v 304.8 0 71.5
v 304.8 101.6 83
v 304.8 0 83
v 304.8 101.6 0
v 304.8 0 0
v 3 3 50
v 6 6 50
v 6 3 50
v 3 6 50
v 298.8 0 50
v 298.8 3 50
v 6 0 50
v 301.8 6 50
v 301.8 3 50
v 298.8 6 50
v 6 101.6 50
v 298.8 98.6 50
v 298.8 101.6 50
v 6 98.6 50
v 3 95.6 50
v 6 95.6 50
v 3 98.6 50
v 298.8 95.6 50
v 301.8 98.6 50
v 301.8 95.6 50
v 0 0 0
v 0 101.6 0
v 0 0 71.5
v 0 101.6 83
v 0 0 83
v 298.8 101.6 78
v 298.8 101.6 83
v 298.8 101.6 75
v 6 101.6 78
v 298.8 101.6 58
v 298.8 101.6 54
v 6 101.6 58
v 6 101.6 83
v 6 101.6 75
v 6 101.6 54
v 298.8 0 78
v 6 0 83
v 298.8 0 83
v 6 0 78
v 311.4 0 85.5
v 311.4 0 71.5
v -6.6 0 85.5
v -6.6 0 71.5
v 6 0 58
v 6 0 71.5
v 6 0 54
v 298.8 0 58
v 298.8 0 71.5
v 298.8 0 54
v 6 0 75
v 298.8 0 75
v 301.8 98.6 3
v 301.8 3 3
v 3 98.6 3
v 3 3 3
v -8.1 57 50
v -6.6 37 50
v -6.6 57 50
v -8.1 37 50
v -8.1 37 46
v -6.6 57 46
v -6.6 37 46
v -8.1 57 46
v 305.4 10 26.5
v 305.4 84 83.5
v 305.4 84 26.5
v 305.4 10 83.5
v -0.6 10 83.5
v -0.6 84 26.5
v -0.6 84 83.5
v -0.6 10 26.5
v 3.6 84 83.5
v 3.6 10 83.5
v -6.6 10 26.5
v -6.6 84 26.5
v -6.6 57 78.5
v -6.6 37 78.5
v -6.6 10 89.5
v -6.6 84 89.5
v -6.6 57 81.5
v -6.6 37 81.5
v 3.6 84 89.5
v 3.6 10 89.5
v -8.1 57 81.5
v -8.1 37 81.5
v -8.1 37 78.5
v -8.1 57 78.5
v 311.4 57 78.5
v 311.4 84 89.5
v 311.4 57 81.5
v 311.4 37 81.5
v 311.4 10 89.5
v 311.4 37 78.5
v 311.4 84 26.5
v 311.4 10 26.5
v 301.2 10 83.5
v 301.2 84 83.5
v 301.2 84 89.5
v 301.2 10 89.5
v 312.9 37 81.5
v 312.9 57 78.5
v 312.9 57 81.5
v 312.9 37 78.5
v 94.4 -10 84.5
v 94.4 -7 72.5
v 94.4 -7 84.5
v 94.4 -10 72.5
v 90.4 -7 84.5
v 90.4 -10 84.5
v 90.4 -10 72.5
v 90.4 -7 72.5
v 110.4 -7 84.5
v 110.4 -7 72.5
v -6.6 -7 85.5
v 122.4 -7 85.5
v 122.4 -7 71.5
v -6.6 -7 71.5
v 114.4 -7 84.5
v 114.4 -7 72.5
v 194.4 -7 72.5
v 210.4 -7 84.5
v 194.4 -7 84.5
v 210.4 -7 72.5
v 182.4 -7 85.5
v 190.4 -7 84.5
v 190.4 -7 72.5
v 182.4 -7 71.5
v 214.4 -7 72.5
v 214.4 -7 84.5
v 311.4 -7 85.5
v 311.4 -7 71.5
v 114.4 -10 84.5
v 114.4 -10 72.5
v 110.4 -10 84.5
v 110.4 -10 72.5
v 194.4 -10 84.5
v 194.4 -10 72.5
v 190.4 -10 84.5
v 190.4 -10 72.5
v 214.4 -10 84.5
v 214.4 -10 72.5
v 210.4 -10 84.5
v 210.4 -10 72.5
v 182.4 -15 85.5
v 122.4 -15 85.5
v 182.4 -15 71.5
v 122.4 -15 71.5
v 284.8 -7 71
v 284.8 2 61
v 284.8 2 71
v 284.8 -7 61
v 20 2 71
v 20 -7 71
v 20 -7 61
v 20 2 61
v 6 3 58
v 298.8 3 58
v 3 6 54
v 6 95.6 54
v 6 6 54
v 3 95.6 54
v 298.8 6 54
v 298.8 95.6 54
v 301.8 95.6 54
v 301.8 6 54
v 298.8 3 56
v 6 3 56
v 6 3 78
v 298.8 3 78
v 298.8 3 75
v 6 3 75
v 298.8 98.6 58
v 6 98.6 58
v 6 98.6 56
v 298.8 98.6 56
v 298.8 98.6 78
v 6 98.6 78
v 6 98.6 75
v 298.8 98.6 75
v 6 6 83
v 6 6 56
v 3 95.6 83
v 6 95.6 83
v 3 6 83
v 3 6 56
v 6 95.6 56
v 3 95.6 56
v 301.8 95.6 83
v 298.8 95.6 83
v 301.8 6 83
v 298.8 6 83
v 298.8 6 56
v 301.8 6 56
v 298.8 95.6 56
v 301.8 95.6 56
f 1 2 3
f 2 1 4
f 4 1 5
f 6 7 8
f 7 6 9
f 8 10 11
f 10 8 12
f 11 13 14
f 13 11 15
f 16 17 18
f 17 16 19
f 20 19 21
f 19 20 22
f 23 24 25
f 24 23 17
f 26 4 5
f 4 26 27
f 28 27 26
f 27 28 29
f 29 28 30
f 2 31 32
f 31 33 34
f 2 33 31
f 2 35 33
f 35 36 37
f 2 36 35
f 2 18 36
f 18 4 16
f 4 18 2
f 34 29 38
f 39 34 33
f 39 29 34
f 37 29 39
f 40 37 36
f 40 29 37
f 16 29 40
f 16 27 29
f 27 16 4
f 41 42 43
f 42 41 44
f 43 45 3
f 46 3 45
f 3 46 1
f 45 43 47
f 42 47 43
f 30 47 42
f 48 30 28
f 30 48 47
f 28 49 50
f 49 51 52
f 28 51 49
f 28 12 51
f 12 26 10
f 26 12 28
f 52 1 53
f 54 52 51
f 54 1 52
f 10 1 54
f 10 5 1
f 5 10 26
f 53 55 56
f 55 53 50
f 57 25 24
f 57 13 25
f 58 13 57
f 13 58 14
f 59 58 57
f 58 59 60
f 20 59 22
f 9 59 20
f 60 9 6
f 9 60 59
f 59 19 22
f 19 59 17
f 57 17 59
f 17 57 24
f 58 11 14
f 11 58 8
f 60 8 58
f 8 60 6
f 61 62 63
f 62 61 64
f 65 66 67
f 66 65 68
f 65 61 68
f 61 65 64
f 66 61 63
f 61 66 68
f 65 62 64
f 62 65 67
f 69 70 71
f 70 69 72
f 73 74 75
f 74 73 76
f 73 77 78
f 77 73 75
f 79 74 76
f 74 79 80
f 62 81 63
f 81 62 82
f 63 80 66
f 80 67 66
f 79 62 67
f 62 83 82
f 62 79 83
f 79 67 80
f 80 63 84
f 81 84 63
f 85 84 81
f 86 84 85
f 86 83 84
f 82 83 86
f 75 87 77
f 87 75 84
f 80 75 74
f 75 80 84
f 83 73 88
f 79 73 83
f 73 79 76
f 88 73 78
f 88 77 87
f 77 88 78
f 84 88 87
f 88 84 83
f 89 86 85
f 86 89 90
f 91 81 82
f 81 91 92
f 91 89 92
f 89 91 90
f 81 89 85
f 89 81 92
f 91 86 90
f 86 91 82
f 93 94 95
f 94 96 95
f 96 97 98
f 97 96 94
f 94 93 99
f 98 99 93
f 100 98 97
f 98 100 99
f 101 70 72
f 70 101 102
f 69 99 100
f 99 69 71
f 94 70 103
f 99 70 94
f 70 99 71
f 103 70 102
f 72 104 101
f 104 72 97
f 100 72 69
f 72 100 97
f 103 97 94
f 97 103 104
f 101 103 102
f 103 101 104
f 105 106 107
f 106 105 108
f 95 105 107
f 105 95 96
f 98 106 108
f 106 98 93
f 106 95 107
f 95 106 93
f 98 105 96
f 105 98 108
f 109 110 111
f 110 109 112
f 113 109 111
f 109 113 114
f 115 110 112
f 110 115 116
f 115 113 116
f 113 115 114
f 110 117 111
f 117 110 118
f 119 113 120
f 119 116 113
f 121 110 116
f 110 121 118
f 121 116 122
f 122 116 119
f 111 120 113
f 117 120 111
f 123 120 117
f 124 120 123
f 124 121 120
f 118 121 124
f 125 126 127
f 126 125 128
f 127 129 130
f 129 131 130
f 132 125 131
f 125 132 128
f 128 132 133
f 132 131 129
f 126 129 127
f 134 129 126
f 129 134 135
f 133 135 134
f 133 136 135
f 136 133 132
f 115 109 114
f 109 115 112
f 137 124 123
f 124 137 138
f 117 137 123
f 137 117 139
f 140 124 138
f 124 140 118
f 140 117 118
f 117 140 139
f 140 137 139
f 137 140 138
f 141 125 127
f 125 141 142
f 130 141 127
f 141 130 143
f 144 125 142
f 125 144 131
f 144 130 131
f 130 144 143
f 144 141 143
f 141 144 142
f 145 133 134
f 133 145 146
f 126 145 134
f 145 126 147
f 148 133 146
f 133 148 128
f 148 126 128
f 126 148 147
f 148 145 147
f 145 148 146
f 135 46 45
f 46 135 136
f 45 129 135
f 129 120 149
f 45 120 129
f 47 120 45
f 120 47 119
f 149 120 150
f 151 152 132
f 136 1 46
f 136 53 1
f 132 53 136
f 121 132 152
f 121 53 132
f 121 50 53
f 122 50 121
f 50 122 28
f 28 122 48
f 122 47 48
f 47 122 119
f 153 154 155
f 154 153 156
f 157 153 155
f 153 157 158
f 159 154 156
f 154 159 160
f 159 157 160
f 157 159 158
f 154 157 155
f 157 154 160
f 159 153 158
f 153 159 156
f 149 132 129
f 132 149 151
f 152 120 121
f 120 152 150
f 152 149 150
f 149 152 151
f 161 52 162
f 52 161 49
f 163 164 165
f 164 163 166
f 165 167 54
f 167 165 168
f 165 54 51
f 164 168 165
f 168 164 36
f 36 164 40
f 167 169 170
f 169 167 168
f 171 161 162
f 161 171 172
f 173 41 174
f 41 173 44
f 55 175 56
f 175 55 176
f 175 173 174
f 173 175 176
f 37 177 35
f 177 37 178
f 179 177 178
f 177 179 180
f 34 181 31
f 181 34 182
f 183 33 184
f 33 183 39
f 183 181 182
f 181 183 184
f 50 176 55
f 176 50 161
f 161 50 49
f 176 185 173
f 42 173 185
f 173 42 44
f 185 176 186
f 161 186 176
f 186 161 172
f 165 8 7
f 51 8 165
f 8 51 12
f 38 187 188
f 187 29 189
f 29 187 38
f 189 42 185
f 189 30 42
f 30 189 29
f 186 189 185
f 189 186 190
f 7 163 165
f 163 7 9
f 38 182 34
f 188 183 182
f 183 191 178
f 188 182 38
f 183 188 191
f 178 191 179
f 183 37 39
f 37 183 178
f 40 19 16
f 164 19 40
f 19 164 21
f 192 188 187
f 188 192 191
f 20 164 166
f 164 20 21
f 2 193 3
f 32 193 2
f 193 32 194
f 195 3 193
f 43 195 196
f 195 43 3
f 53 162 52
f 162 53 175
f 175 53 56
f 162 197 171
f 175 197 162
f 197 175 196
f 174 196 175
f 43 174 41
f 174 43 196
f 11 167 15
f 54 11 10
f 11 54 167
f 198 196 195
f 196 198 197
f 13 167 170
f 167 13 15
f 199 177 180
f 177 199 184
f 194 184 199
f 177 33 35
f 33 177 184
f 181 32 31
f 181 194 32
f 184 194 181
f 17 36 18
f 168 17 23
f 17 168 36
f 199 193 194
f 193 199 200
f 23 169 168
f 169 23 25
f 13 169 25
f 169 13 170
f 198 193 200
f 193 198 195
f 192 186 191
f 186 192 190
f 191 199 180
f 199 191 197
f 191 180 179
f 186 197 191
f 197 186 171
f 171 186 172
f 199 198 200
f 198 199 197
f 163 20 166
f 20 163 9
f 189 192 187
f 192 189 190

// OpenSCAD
// file: ../top_ref.scad
// top_ref.scad  — FAITHFUL reference of the real uploaded top tray (L3.stl)
// Extracted from L3.stl by voxel analysis. Coordinates: new-tray top face = z=0 here,
// call top_ref(base=50) to seat it on a 50mm-tall new tray.
// DO NOT MODIFY THIS PART IN ANY DESIGN — it represents an already-printed tray.
//
// Real dims: 304.8 (X) x 101.6 (Y) x 33 (Z).
//  - END walls (short, x=0..3 and 301.8..304.8): SOLID full height -> top at z=33 (seated 83)
//  - LONG sides (front y=0..3, back y=98.6..101.6): OPEN FRAME
//        bottom rail z=4..8, top rail z=25..28, OPEN between (z=9..24)
//        side top edge at z=28 (seated 78)
//  - Corners: full height to z=33 (seated 83)
//  - Floor plate: z=4..6
// Seated mapping (base=50): add 50 to every z below.

TR_X = 304.8;
TR_Y = 101.6;
TR_Z = 33;
TR_wall = 3;        // side/end wall thickness
TR_endw = 3;        // short-end wall thickness
TR_botrail_z0 = 4;  TR_botrail_z1 = 8;     // long-side bottom rail
TR_toprail_z0 = 25; TR_toprail_z1 = 28;    // long-side top rail (side top edge=28)
TR_floor_z0 = 4;    TR_floor_z1 = 6;
TR_corner = 6;      // corner post footprint (x & y) kept full height

module top_ref(base=50, col="#90A4AE", alpha=1.0) {
    color(col, alpha)
    translate([0,0,base])
    union() {
        // ---- floor plate ----
        translate([TR_endw, TR_wall, TR_floor_z0])
            cube([TR_X-2*TR_endw, TR_Y-2*TR_wall, TR_floor_z1-TR_floor_z0]);
        // ---- two short END walls: full height ----
        cube([TR_endw, TR_Y, TR_Z]);
        translate([TR_X-TR_endw,0,0]) cube([TR_endw, TR_Y, TR_Z]);
        // ---- long-side OPEN FRAMES (front & back) ----
        for (yy=[0, TR_Y-TR_wall]) {
            // bottom rail
            translate([0, yy, TR_botrail_z0]) cube([TR_X, TR_wall, TR_botrail_z1-TR_botrail_z0]);
            // top rail (side top edge)
            translate([0, yy, TR_toprail_z0]) cube([TR_X, TR_wall, TR_toprail_z1-TR_toprail_z0]);
        }
        // ---- corner posts full height (tie frames together, reach z=33) ----
        for (xx=[0, TR_X-TR_corner], yy=[0, TR_Y-TR_corner])
            translate([xx,yy,0]) cube([TR_corner, TR_corner, TR_Z]);
    }
}

// Convenience constants a design can reference (seated, base=50):
//   END-wall top edge:        z = 50+33 = 83  (over the short ends -> strong clamp)
//   Long-side top rail top:   z = 50+28 = 78  (hook over / under along front)
//   Long-side open slot:      z = 50+9 .. 50+24 = 59..74 (reach a tongue in anywhere)
//   Corner top:               z = 83
// main file
// 04_best_clamp.scad
// WILDCARD BEST VARIANT: TRIPLE-ENGAGEMENT LIFT-LOCK
//
// The definitive design combining all strengths:
//
// MECHANISM — "Lift & Click":
//   1. Top tray placed down freely (jaws stowed below z=50, nothing above)
//   2. User grips the SPINE BAR (front face, z≈30, full-width handle) with
//      fingertips and sweeps it UPWARD in one motion (~44mm travel)
//   3. As the spine rises:
//      a. TWO L-HOOKS at the ends climb past z=83 and hook over the end-wall
//         tops → AXIAL LOCK (prevents Z lift)
//      b. A FRONT TONGUE integrated into the spine enters the front open slot
//         (z=59..74) and seats against the front top rail → ANTI-RATTLE
//      c. A SNAP RIDGE on each hook arm clicks over a tray ridge → DETENT HOLD
//   4. To unlock: squeeze the centre of spine bar inward (flex clears snap) and
//      sweep downward. ONE motion, ONE hand.
//
// CAPTURE GEOMETRY:
//   - End hooks: 5mm×70mm×2 sides → hook area = 5×70×2 = 700mm².
//     At 2mm lift of top tray, overlap = 700×min(2, HOOK_H=5) = 700mm³ >> 200mm³
//   - Front slot tongue adds anti-rattle without adding to capture count
//
// DOOR FLUSH: all hardware at x<0 or x>304.8 (ends) or y≤0 (front)
// OVERHEAD: unlocked state max z = 50 (new tray top face only)

show = "all"; // [all,new,top]
lock = 1;     // 0=open, 1=locked

include <../top_ref.scad>

$fn = 48;

// ─── Tray constants ──────────────────────────────────────────────────────────
NTX = 304.8;  NTY = 101.6;  NTZ = 50;  WALL = 3;
END_WALL_T = 3;   // top tray end wall thickness
END_TOP_Z  = 83;  // end wall top (seated)
SLOT_BOT   = 59;  // front open slot bottom z
SLOT_TOP   = 74;  // front open slot top z
RAIL_BOT   = 75;  // front top rail underside z

// ─── Hook arm parameters ─────────────────────────────────────────────────────
// Thicker hook arm for strength; slightly inset from tray corners
HOOK_STEM_T = 6;     // hook stem thickness in X
HOOK_GAP    = 0.6;   // clearance between hook and top tray end wall
HOOK_SPAN_Y = 74;    // hook arm span in Y (y=10..84, avoids door corner y=95+)
HOOK_Y0     = 10;    // hook arm starts at y=10

HOOK_NOSE_H  = 6;    // hook nose height in Z when locked (=overlap at 2mm lift → 6×74×2=888mm³)
HOOK_NOSE_XW = HOOK_STEM_T + END_WALL_T + 2*HOOK_GAP;  // nose spans end wall = 10.2mm

HOOK_STEM_H_OUTER = 57;   // full stem height in Z
HOOK_Z_UNLOCK     = 38;   // hook NOSE bottom z when unlocked (hook z=38..44, below z=50 ✓)
HOOK_Z_LOCK       = 83.5; // hook nose bottom z when locked (above z=83 ✓)
HOOK_TRAVEL       = HOOK_Z_LOCK - HOOK_Z_UNLOCK;  // 45.5mm

// ─── Spine bar parameters ─────────────────────────────────────────────────────
SPINE_H    = 14;   // spine bar height in Z (ergonomic grip)
SPINE_T    = 7;    // spine depth in Y (protrudes forward from tray face)
SPINE_Z_UNLOCK = 26;  // spine bar bottom z when unlocked (z=26..40, below z=50 ✓)
SPINE_Z_LOCK   = SPINE_Z_UNLOCK + HOOK_TRAVEL;  // = 71.5, top at 85.5 > 83 ✓
// Wait — when locked, spine_z_bottom=71.5, top=71.5+14=85.5. The spine bar
// when locked is at z=71.5..85.5, which is above new tray top (z=50). It will
// be outside the seated top tray's lateral footprint (y<0) so OK.

// Tongue geometry (front slot engagement)
// Tongue enters front slot z=59..74, from y=0..TONGUE_DEPTH inside front wall
TONGUE_Z_CTR = 66;        // tongue center z (in slot)
TONGUE_H_SIZE = 10;       // tongue height z=61..71 (well within 59..74)
TONGUE_DEPTH  = 2.0;      // tongue depth in Y (enters slot from outside)
TONGUE_X0     = 20;       // tongue start x (clear of corners)
TONGUE_X1     = NTX-20;   // tongue end x

// Snap detent: a ridge on the hook arm snaps over new tray rim in locked position
SNAP_H   = 1.5;   // snap ridge height (sticks out on outside face)
SNAP_W   = 3;     // snap ridge width in Z

// ─── New tray ─────────────────────────────────────────────────────────────────
module new_tray() {
    color("#1565C0")
    difference() {
        cube([NTX, NTY, NTZ]);
        // hollow interior
        translate([WALL, WALL, WALL])
            cube([NTX-2*WALL, NTY-2*WALL, NTZ-WALL+0.1]);
        // Front wall tongue slot (allows locked tongue to pass through)
        // Slot: y=0..WALL+clearance, z=tongue zone, x=tongue span
        translate([TONGUE_X0, -0.1, TONGUE_Z_CTR - TONGUE_H_SIZE/2])
            cube([TONGUE_X1-TONGUE_X0, WALL+0.2, TONGUE_H_SIZE]);
    }
    // Snap ledge on end faces (small ridge that hook snaps over)
    color("#1565C0")
    for (sx=[0,1]) {
        ledge_x = sx==0 ? -(HOOK_STEM_T+HOOK_GAP+SNAP_H) : NTX+HOOK_GAP;
        translate([ledge_x, HOOK_Y0 + HOOK_SPAN_Y/2 - 10, NTZ-4])
            cube([SNAP_H+0.5, 20, 4]);
    }
}

// ─── Single hook arm ─────────────────────────────────────────────────────────
module hook_arm(side, lock_state) {
    hook_z   = lock_state==1 ? HOOK_Z_LOCK : HOOK_Z_UNLOCK;
    stem_z0  = hook_z - HOOK_STEM_H_OUTER;

    // Stem x: outside the top tray end wall
    stem_x   = side==0 ? -(HOOK_STEM_T+HOOK_GAP) : NTX+HOOK_GAP;
    nose_x   = side==0 ? -(HOOK_STEM_T+HOOK_GAP) : NTX-END_WALL_T-HOOK_GAP;

    color("#D84315")
    translate([0, HOOK_Y0, 0])
    union() {
        // Main stem (vertical bar on outside face)
        translate([stem_x, 0, stem_z0])
            cube([HOOK_STEM_T, HOOK_SPAN_Y, HOOK_STEM_H_OUTER]);

        // Hook nose (extends inward over end wall top when raised)
        translate([nose_x, 0, hook_z])
            cube([HOOK_NOSE_XW, HOOK_SPAN_Y, HOOK_NOSE_H]);

        // Snap ridge on stem (bites over new tray rim ledge)
        snap_x = side==0 ? stem_x - SNAP_H : stem_x + HOOK_STEM_T;
        translate([snap_x, HOOK_SPAN_Y/2-10, hook_z - 5])
            cube([SNAP_H, 20, SNAP_W]);
    }
}

// ─── Spine bar ────────────────────────────────────────────────────────────────
module spine_bar(lock_state) {
    sz0  = lock_state==1 ? SPINE_Z_LOCK : SPINE_Z_UNLOCK;
    sy0  = -SPINE_T;   // front face of bar at y=-SPINE_T

    color("#D84315")
    union() {
        // Main horizontal spine (full width including hook zones)
        translate([-(HOOK_STEM_T+HOOK_GAP), sy0, sz0])
            cube([NTX + 2*(HOOK_STEM_T+HOOK_GAP), SPINE_T, SPINE_H]);

        // Tongue section (slides into front slot when locked)
        if (lock_state == 1) {
            translate([TONGUE_X0, sy0, TONGUE_Z_CTR - TONGUE_H_SIZE/2])
                cube([TONGUE_X1-TONGUE_X0, SPINE_T + TONGUE_DEPTH, TONGUE_H_SIZE]);
        }

        // Grip ridges on front face (ergonomic thumb grip for push-up)
        for (rx = [-60,-40,-20,0,20,40,60]) {
            translate([NTX/2+rx-2, sy0-3, sz0+1])
                cube([4, 3, SPINE_H-2]);
        }
        // Wide thumb boss in center
        translate([NTX/2-30, sy0-8, sz0])
            cube([60, 8, SPINE_H]);
    }
}

// ─── New assembly ─────────────────────────────────────────────────────────────
module new_assembly(lock_state) {
    new_tray();
    hook_arm(0, lock_state);
    hook_arm(1, lock_state);
    spine_bar(lock_state);
}

// ─── Render ───────────────────────────────────────────────────────────────────
if (show != "top") new_assembly(lock);
if (show != "new") top_ref(50);
